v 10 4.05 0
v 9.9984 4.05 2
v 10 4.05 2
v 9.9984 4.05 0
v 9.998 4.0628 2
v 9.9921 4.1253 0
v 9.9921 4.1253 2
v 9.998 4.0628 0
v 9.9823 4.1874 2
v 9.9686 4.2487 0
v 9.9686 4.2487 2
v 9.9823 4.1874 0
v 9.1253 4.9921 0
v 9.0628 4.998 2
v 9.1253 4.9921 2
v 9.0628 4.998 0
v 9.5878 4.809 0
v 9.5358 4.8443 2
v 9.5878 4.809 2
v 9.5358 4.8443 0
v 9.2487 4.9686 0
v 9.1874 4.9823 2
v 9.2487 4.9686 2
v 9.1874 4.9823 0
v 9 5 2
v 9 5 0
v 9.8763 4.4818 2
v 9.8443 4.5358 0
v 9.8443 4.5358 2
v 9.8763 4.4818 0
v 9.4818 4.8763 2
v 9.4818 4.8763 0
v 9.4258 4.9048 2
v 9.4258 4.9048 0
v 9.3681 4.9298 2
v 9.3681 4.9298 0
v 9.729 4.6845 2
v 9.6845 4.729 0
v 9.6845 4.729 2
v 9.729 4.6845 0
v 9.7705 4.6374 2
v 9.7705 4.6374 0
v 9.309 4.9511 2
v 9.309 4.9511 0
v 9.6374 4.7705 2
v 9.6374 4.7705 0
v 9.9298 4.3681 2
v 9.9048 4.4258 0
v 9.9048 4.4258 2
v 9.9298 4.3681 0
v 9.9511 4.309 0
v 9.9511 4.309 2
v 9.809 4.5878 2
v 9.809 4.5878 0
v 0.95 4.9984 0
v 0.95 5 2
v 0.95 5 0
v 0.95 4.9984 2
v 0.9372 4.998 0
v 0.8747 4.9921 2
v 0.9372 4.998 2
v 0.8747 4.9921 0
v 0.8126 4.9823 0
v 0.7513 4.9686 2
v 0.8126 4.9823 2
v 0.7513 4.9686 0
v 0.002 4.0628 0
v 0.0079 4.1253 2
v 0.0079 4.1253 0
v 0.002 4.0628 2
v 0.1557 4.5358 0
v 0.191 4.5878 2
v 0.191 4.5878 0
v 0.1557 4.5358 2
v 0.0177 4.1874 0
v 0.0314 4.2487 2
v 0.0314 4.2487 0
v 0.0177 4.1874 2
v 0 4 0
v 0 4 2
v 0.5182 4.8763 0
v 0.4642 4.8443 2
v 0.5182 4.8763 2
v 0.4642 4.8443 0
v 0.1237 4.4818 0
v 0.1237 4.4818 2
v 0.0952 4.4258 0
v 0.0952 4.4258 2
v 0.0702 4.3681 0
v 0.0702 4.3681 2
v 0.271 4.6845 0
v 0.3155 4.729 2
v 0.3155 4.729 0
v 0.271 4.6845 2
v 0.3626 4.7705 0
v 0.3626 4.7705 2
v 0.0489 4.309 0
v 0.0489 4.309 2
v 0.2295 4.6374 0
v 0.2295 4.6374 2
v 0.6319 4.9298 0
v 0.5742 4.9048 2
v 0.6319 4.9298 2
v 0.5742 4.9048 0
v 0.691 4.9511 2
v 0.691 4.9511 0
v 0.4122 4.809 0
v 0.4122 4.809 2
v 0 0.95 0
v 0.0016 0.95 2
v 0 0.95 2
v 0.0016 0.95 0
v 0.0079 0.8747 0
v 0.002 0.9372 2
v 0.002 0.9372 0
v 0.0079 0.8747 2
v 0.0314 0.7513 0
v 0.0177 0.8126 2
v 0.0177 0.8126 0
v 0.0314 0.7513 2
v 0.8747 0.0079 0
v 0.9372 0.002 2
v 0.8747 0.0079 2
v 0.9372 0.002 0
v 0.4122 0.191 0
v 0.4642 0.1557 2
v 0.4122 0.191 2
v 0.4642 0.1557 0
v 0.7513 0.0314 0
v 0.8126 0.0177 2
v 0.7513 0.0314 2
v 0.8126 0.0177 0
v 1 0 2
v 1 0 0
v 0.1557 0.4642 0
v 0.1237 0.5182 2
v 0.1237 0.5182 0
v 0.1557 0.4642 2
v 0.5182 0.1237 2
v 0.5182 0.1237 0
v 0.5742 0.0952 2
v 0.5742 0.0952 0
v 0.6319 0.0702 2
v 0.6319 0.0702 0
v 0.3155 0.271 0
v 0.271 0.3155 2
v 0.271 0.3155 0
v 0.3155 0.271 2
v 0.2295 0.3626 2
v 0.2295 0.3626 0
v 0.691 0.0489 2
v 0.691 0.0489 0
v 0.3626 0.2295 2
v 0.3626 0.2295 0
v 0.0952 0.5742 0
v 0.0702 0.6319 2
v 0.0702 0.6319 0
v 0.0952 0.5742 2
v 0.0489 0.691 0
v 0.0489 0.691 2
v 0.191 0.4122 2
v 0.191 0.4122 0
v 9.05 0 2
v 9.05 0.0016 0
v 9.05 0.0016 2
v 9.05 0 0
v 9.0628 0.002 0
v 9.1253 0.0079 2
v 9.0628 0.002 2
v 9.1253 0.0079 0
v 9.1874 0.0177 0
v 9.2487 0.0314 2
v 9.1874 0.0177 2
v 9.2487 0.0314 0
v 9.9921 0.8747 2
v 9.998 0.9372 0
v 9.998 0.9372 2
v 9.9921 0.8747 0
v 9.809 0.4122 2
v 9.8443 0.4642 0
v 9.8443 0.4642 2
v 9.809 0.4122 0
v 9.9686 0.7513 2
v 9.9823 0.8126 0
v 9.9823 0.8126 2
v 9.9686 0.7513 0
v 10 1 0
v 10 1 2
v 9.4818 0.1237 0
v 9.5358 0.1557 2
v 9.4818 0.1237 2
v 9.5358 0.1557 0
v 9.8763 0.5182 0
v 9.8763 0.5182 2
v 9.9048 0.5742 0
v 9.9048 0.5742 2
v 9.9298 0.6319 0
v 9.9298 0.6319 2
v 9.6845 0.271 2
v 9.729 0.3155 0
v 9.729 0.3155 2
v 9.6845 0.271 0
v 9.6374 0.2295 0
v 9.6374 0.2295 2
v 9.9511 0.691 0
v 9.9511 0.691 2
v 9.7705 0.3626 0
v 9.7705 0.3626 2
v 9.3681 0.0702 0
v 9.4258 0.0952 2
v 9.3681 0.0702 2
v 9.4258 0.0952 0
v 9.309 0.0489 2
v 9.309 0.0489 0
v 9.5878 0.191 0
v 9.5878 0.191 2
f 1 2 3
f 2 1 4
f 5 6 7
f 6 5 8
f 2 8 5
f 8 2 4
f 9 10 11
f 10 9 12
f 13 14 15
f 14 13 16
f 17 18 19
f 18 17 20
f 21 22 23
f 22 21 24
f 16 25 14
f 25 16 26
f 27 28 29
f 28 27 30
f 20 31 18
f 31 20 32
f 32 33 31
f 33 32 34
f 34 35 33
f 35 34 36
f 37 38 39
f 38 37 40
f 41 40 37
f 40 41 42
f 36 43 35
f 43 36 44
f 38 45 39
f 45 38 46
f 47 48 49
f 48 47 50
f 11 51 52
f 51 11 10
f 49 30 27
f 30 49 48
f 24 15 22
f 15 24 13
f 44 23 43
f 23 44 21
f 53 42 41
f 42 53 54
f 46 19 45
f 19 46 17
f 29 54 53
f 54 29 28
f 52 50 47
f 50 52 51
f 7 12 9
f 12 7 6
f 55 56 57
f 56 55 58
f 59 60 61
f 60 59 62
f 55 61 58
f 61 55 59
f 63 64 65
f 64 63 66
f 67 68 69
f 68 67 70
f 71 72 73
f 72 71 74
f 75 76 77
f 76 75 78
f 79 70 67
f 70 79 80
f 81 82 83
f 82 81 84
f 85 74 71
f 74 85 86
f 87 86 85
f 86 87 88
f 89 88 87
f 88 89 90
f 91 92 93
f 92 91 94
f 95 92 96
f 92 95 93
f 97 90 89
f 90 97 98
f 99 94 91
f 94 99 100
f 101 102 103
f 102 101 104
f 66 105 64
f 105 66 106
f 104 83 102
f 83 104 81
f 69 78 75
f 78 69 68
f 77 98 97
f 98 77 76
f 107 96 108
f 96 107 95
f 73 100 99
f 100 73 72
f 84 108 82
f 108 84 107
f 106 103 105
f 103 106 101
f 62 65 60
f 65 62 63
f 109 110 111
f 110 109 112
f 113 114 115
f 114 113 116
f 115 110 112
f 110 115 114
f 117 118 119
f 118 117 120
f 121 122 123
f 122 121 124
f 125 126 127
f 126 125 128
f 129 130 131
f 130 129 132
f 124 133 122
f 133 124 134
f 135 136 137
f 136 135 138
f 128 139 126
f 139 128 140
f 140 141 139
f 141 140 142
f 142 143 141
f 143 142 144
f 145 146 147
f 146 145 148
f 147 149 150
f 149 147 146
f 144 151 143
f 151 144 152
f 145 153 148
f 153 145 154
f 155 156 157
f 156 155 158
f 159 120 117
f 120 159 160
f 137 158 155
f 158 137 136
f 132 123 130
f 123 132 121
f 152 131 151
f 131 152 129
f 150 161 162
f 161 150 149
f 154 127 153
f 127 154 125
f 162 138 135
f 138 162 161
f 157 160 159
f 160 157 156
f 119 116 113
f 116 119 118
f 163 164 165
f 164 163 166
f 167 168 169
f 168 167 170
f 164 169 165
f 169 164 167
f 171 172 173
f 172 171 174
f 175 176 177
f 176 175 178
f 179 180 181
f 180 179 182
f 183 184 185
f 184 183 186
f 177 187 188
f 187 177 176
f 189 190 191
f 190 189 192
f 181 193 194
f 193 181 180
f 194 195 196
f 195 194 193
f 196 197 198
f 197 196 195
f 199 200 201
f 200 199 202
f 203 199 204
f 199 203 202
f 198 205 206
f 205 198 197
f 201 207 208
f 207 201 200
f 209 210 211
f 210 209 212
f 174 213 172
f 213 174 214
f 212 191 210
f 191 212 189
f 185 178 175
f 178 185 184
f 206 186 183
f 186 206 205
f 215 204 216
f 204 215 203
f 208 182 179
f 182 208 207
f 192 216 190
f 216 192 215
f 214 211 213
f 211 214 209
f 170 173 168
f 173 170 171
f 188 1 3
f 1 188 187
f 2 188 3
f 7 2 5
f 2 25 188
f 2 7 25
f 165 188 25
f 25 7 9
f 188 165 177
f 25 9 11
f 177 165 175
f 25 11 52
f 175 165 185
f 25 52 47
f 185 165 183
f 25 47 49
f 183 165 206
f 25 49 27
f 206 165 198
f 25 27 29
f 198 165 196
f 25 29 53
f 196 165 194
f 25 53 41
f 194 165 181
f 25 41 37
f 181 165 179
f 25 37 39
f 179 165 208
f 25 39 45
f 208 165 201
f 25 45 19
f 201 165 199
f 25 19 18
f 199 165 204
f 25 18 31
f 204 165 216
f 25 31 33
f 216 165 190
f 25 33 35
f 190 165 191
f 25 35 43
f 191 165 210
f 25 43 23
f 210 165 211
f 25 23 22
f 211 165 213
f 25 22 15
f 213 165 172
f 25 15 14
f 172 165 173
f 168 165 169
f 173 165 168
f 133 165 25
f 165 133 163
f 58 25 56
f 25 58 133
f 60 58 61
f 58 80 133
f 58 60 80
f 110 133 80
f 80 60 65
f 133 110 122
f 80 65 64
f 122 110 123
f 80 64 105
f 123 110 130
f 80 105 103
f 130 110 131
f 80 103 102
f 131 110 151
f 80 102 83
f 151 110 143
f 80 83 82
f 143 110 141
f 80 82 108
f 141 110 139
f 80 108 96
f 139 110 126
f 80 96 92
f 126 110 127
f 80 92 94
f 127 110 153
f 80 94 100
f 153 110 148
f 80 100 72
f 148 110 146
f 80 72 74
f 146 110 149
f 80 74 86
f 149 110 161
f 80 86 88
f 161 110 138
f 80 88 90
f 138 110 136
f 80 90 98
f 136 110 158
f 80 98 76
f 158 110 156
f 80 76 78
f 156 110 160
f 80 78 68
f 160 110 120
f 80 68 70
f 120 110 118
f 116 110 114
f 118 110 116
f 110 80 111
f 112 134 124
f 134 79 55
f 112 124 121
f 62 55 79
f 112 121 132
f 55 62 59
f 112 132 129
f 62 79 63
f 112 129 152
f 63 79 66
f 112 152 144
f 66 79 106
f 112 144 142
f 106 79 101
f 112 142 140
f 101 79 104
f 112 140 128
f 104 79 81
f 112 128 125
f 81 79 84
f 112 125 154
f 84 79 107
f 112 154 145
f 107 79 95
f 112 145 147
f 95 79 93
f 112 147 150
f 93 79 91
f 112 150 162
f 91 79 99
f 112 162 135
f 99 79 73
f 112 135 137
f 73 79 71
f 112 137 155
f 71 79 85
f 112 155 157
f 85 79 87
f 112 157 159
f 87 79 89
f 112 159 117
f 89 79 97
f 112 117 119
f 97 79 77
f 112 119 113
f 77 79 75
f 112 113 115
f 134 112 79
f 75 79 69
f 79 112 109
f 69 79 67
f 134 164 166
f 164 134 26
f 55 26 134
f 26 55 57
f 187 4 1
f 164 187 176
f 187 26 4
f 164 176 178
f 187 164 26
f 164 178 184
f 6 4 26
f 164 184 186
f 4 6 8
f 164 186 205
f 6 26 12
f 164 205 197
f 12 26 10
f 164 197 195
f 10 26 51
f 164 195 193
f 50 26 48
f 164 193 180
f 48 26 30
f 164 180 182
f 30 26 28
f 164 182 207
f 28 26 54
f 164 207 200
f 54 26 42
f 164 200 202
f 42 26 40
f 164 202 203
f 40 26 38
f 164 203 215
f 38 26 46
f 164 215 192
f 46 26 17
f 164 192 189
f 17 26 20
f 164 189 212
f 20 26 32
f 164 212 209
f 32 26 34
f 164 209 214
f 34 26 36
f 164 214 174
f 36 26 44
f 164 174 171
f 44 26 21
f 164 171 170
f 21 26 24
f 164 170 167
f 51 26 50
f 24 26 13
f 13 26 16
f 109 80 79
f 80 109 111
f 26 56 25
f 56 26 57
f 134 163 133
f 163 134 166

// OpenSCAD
/*
http://codeviewer.org/view/code:1b36 
Copyright (C) 2011 Sergio Vilches
This program is free software: you can redistribute it and/or modify it under the terms of the GNU General Public License as published by the Free Software Foundation, either version 3 of the License, or (at your option) any later version.
This program is distributed in the hope that it will be useful, but WITHOUT ANY WARRANTY; without even the implied warranty of MERCHANTABILITY or FITNESS FOR A PARTICULAR PURPOSE. See the GNU General Public License for more details. You should have received a copy of the GNU General Public License along with this program. If not, see <http://www.gnu.org/licenses/>.
Contact: s.vilches.e@gmail.com


    ----------------------------------------------------------- 
                 Round Corners Cube (Extruded)                
      roundCornersCube(x,y,z,r) Where:                        
         - x = Xdir width                                     
         - y = Ydir width                                     
         - z = Height of the cube                             
         - r = Rounding radious                               
                                                              
      Example: roundCornerCube(10,10,2,1);                    
     *Some times it's needed to use F6 to see good results!   
 	 ----------------------------------------------------------- 
*/
// Test it!
// roundCornersCube(10,5,2,1);


module createMeniscus(h,radius) // This module creates the shape that needs to be substracted from a cube to make its corners rounded.
difference(){        //This shape is basicly the difference between a quarter of cylinder and a cube
   translate([radius/2+0.1,radius/2+0.1,0]){
      cube([radius+0.2,radius+0.1,h+0.2],center=true);         // All that 0.x numbers are to avoid "ghost boundaries" when substracting
   }

   cylinder(h=h+0.3,r=radius,$fn = 100,center=true);
}


module roundCornersCube(x,y,z,r)  // Now we just substract the shape we have created in the four corners
difference(){
   cube([x,y,z]);

   translate([x-r,y-r,z/2]){  // We move to the first corner (x,y)
      rotate(0){  
         createMeniscus(z,r); // And substract the meniscus
      }
   }
   translate([r,y-r,z/2]){ // To the second corner (0,y)
      rotate(90){
         createMeniscus(z,r); // But this time we have to rotate the meniscus 90 deg
      }
   }
   translate([r,r,z/2]){ // ... 
      rotate(180){
         createMeniscus(z,r);
      }
   }
   translate([x-r,r,z/2]){
      rotate(270){
         createMeniscus(z,r);
      }
   }
}

roundCornersCube(10,5,2,1);
